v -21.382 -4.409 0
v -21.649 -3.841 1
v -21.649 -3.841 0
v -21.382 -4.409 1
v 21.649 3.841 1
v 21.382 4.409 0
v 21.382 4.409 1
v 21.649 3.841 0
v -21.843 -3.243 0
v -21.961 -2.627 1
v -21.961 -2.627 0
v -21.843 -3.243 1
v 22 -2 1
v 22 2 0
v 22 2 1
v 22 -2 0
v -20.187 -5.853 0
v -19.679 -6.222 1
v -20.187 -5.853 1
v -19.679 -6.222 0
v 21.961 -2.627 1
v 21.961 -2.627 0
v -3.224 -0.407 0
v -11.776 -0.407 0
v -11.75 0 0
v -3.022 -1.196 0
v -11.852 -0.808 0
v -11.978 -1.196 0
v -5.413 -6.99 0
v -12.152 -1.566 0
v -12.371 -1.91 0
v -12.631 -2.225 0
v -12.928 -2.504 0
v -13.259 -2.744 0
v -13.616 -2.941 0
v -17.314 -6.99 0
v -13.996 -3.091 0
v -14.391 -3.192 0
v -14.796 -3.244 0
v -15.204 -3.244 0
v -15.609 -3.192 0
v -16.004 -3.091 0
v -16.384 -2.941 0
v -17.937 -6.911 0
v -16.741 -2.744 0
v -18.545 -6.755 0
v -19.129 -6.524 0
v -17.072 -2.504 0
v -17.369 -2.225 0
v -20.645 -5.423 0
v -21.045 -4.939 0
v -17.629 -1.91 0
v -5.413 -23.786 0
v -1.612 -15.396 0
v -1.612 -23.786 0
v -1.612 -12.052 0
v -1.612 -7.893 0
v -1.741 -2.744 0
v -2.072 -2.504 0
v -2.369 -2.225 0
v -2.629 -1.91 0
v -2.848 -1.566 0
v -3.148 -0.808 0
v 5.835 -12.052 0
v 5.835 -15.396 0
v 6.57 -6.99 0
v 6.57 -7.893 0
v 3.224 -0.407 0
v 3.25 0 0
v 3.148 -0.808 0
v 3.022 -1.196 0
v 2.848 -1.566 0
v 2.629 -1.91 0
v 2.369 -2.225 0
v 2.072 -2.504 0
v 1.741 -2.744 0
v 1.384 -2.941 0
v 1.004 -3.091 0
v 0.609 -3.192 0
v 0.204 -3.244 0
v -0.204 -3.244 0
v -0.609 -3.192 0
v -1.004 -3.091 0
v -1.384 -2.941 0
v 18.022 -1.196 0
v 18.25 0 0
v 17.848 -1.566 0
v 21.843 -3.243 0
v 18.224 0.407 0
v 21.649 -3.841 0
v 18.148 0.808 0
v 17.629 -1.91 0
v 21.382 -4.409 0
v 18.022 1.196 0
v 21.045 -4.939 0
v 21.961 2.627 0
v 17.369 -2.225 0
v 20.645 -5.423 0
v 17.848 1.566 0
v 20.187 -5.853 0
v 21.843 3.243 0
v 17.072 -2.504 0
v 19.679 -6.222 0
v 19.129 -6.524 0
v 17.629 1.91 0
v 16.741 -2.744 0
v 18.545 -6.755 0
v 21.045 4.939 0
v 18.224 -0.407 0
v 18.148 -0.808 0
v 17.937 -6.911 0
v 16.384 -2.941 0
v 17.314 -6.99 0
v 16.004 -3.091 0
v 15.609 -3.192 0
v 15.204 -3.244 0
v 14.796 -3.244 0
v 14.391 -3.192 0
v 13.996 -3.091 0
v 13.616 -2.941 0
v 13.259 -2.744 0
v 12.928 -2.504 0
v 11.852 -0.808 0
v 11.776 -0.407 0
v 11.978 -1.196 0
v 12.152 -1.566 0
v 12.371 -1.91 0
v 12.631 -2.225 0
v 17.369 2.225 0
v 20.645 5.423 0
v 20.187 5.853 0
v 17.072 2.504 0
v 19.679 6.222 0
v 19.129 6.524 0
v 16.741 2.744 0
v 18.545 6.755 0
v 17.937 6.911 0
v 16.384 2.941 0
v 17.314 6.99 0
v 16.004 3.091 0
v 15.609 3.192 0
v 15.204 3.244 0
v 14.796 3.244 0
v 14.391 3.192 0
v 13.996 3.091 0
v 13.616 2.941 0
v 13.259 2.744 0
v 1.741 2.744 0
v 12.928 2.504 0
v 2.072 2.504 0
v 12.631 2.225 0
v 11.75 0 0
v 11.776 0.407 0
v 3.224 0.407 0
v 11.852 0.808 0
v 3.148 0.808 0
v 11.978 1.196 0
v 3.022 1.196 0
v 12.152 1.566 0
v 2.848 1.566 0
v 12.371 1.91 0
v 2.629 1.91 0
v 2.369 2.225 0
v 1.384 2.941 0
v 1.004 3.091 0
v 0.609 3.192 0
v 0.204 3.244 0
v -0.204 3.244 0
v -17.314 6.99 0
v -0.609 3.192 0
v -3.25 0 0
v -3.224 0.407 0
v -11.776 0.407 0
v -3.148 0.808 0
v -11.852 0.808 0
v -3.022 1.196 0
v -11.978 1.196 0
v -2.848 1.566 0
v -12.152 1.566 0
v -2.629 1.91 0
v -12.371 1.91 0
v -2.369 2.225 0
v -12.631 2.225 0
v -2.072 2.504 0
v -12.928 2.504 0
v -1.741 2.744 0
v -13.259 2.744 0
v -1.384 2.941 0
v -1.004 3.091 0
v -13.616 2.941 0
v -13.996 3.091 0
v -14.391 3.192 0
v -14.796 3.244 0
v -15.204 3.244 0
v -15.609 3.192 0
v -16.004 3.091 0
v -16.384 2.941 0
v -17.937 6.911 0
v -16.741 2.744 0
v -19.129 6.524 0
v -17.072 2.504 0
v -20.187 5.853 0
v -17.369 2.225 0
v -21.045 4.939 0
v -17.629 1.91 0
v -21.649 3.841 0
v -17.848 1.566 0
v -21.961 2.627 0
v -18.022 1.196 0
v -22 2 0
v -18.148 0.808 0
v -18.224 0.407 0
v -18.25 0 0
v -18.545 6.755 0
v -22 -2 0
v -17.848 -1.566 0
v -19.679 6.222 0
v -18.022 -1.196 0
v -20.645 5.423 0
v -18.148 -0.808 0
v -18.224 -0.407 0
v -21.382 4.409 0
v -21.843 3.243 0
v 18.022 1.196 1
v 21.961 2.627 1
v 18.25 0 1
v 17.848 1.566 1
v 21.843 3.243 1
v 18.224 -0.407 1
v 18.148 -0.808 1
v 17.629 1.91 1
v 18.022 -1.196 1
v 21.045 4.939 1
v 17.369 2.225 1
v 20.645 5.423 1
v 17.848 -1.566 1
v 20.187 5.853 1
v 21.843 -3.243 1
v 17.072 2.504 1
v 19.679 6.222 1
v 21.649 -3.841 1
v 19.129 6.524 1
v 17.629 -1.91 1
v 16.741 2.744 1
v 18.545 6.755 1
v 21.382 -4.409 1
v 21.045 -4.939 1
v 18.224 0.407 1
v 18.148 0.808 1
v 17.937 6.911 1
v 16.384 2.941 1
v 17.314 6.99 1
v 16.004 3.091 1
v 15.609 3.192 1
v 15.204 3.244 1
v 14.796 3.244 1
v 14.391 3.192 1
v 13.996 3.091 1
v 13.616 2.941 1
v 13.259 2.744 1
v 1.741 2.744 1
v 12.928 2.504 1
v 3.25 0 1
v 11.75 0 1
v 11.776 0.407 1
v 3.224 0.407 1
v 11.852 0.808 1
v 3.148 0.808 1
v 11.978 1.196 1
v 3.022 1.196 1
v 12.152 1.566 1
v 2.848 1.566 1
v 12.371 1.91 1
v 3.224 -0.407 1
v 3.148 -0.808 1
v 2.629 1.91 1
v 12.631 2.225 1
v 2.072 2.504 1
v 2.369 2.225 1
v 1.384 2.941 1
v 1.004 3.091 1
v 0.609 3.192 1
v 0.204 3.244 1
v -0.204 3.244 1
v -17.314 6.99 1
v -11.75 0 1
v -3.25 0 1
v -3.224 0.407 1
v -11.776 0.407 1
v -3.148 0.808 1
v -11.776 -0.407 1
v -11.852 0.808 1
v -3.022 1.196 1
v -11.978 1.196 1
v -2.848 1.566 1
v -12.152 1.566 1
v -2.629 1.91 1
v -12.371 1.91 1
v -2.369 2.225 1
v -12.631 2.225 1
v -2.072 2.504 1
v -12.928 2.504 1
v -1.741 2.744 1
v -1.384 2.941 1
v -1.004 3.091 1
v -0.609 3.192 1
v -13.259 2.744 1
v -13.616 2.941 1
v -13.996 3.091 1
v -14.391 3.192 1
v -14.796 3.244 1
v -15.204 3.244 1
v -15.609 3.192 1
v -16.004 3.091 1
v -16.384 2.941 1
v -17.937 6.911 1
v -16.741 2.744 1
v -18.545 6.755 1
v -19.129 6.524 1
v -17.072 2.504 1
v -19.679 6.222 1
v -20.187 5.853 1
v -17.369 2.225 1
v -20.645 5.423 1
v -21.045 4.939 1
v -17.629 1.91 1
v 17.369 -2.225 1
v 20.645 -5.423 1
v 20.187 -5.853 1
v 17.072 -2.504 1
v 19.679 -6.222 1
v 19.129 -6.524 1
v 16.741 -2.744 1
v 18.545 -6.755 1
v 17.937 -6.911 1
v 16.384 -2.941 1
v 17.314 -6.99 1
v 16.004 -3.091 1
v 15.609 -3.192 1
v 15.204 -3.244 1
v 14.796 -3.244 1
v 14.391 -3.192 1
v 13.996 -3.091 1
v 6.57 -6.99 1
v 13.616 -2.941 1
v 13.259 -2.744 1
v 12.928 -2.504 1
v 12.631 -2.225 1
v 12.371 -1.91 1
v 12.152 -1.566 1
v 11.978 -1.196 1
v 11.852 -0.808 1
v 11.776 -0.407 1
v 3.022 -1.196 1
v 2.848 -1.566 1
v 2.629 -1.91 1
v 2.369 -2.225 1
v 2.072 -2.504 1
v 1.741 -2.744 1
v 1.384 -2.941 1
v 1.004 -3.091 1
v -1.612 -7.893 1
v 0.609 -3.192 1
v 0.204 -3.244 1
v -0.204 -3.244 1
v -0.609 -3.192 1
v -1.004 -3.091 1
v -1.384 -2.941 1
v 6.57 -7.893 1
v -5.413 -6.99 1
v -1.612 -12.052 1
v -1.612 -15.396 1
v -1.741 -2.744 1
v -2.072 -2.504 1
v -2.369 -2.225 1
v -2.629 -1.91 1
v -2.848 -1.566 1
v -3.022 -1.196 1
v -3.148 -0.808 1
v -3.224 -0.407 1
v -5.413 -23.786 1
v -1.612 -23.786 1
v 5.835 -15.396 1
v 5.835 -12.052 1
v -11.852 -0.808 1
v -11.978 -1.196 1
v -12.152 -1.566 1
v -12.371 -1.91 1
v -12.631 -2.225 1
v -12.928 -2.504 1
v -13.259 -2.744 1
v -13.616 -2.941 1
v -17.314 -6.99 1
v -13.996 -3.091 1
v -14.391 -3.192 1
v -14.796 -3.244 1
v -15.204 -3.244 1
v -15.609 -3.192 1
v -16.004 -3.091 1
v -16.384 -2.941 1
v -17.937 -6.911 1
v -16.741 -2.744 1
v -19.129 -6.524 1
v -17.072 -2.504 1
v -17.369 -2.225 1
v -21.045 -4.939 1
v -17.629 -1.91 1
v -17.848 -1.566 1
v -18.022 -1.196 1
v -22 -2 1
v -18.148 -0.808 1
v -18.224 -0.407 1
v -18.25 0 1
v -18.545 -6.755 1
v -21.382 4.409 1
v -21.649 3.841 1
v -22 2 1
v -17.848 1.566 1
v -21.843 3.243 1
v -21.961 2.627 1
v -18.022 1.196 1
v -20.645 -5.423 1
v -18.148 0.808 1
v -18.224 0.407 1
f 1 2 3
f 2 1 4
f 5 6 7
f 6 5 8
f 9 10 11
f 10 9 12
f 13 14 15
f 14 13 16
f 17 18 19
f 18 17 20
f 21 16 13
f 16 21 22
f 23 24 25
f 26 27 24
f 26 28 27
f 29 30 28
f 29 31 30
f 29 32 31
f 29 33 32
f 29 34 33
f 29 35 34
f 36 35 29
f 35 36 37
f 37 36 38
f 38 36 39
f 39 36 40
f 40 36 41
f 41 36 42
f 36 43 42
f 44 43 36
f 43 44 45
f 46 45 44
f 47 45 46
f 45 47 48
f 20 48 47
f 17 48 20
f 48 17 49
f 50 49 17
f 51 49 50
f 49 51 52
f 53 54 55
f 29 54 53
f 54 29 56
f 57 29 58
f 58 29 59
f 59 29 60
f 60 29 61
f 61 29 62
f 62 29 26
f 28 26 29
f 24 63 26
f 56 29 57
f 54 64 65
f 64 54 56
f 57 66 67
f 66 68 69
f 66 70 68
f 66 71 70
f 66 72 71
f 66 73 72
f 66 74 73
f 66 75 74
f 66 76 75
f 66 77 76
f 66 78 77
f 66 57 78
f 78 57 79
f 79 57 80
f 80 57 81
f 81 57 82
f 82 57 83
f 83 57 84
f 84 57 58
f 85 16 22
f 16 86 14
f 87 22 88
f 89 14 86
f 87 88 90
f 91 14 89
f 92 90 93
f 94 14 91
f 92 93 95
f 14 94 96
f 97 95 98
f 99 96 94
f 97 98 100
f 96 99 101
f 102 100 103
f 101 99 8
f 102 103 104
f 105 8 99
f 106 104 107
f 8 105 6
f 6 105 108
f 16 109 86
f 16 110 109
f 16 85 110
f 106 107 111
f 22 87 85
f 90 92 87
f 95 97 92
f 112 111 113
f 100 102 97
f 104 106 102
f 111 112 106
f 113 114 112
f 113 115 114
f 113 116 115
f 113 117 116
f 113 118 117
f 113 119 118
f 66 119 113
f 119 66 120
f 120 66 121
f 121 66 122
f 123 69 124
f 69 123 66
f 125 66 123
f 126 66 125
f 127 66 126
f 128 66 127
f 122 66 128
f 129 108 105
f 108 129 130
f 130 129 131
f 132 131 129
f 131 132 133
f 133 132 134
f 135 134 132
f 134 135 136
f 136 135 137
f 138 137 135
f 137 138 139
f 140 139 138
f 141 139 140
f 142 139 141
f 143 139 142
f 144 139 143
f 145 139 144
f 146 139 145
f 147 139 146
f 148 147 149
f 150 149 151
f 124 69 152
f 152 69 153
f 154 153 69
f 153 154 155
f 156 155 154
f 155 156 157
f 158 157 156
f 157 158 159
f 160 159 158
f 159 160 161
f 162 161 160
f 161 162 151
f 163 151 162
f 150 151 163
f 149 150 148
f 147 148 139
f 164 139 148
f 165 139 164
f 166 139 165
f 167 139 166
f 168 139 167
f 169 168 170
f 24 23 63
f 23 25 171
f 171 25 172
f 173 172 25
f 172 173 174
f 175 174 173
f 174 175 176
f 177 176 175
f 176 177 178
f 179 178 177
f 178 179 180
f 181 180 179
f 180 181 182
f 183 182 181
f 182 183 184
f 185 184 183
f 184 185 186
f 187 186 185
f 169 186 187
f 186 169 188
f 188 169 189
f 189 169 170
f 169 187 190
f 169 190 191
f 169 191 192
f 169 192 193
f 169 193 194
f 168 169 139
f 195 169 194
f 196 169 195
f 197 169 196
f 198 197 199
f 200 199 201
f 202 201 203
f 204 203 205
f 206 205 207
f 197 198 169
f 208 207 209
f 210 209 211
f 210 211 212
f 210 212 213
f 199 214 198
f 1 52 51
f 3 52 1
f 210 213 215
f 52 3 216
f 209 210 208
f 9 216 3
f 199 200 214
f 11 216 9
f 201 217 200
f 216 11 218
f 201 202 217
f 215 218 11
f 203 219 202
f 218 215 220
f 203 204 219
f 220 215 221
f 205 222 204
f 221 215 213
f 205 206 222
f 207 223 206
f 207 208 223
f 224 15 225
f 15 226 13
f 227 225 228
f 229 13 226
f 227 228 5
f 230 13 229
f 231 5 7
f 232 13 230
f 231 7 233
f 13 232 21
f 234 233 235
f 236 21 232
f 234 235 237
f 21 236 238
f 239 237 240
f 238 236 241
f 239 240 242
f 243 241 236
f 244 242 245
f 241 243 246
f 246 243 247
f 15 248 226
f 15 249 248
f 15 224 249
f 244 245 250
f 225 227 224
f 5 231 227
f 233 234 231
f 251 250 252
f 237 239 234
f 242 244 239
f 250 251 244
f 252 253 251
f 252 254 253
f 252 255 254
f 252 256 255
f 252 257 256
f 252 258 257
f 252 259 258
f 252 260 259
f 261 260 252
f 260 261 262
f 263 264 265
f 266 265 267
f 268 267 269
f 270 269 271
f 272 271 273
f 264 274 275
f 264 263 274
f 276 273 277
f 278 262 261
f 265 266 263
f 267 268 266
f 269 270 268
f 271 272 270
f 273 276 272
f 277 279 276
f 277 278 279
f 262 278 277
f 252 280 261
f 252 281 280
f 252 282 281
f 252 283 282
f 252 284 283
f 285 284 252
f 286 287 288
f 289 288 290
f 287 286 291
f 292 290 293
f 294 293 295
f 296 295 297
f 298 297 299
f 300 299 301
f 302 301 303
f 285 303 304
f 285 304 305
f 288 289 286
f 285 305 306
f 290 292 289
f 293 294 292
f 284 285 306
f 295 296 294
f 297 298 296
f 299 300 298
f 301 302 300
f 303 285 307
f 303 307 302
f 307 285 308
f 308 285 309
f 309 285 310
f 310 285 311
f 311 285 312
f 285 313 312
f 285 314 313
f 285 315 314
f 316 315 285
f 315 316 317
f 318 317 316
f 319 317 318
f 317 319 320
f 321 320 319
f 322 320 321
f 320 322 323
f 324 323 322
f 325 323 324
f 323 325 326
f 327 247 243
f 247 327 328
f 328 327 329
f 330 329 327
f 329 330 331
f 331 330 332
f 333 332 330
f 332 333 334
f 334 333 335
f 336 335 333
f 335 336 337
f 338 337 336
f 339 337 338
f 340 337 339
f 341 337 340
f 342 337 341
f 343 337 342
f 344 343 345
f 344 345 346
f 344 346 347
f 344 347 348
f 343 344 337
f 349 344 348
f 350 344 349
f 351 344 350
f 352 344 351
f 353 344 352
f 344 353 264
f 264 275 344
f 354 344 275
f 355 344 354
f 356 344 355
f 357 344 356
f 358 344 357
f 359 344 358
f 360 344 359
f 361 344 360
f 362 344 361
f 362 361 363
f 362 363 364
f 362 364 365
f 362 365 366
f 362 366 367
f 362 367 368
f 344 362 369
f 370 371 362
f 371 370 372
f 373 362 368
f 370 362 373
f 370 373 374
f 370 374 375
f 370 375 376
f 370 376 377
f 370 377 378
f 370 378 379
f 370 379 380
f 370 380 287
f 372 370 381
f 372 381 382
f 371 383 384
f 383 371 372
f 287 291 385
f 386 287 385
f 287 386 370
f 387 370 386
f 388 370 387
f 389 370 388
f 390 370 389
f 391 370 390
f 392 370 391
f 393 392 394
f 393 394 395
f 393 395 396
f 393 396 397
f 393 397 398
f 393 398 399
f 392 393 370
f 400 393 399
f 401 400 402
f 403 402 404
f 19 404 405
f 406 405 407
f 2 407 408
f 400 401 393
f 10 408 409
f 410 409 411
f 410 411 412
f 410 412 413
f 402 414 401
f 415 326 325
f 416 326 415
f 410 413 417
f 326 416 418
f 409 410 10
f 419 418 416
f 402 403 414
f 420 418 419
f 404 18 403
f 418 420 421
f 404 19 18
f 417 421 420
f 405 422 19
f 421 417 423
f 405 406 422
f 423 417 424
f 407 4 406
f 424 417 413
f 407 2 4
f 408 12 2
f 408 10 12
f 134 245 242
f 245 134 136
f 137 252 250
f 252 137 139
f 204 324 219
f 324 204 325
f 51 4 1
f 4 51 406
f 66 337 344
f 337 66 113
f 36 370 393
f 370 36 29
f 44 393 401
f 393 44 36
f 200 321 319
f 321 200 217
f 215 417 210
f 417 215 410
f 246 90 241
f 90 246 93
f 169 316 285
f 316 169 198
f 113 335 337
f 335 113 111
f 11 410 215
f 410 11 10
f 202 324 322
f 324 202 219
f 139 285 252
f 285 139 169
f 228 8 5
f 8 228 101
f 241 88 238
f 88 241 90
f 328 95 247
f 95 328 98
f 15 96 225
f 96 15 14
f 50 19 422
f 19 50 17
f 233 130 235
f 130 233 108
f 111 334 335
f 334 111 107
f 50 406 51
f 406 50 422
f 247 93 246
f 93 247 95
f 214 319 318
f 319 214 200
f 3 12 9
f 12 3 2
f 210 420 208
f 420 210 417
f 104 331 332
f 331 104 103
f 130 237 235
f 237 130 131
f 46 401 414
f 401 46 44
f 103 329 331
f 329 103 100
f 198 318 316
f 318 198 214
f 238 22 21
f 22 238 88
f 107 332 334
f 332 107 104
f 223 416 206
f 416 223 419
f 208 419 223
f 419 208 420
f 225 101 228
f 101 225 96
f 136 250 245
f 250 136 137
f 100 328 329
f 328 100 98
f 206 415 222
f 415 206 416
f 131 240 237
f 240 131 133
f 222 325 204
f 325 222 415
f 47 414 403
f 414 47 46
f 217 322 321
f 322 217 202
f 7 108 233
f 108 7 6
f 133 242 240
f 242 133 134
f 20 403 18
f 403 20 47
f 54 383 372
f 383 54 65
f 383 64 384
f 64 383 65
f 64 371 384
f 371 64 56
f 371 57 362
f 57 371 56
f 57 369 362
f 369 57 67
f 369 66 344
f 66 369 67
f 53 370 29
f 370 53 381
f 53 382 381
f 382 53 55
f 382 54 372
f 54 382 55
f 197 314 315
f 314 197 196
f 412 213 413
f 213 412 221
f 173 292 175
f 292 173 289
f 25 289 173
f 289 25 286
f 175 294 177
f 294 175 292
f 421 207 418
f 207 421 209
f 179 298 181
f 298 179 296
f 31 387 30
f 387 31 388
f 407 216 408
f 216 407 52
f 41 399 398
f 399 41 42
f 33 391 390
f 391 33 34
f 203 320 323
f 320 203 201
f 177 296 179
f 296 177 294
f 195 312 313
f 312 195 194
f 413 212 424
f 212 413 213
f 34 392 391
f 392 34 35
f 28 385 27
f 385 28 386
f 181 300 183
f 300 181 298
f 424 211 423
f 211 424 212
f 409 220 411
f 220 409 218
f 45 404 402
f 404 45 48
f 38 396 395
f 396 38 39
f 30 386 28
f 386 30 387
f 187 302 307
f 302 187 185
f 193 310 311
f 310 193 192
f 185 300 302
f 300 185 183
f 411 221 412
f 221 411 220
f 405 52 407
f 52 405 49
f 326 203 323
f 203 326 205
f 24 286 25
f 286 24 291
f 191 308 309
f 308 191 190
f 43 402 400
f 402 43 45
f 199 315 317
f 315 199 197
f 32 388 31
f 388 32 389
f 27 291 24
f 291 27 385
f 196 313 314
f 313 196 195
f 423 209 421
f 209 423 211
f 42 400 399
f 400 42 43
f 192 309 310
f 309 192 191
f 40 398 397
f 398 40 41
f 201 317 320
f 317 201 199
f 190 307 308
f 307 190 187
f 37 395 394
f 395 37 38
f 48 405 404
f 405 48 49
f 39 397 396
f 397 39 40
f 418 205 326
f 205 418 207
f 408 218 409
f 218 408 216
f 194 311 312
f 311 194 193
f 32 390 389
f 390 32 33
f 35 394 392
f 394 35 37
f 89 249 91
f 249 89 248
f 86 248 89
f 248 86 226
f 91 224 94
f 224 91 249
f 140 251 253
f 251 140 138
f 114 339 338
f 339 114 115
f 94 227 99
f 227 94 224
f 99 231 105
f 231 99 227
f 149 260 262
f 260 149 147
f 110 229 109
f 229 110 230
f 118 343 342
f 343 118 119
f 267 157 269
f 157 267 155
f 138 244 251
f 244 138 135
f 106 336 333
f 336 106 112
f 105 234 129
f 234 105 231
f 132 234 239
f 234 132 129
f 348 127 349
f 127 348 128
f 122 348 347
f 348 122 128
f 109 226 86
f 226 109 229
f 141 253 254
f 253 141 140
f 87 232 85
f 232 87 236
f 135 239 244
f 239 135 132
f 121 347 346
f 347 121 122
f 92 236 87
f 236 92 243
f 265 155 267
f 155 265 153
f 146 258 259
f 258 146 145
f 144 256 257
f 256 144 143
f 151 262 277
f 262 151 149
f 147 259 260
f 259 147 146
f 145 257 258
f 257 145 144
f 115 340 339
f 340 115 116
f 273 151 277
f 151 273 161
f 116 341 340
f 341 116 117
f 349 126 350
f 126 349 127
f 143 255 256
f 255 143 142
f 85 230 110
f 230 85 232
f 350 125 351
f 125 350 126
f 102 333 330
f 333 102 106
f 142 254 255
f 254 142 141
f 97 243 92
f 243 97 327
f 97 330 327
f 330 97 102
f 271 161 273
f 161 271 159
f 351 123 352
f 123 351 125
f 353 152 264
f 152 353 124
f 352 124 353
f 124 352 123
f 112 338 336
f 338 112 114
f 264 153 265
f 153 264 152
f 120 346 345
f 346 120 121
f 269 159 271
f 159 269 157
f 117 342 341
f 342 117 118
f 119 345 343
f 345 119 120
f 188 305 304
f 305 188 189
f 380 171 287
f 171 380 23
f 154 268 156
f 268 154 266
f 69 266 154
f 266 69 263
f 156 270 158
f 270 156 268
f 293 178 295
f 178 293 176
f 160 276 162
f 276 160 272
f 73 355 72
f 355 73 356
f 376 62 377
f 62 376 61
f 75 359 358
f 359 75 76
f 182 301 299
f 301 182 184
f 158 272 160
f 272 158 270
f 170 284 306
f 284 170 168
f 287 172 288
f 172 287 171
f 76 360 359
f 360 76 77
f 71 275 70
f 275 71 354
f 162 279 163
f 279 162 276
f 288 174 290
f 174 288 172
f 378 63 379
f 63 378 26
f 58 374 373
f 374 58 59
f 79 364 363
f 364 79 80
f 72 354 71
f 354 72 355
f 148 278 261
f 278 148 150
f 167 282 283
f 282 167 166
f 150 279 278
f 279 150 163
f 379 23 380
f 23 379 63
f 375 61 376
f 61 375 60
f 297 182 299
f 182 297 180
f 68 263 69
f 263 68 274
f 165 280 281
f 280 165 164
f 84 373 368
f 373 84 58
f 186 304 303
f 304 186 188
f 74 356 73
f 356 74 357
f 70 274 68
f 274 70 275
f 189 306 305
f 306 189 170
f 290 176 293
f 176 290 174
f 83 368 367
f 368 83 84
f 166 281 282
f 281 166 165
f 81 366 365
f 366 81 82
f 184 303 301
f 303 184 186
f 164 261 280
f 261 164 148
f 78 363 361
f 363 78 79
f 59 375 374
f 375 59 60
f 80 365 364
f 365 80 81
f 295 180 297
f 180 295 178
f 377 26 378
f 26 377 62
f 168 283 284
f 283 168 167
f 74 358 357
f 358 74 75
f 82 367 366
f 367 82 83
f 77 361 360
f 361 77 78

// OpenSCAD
$fn = 50;


difference() {
	union() {
		translate(v = [0, 0, 0]) {
			rotate(a = [0, 0, 0]) {
				hull() {
					translate(v = [-17.0000000000, 2.0000000000, 0]) {
						rotate(a = [0, 0, 0]) {
							translate(v = [0, 0, 0]) {
								rotate(a = [0, 0, 0]) {
									cylinder(h = 1, r = 5);
								}
							}
						}
					}
					translate(v = [17.0000000000, 2.0000000000, 0]) {
						rotate(a = [0, 0, 0]) {
							translate(v = [0, 0, 0]) {
								rotate(a = [0, 0, 0]) {
									cylinder(h = 1, r = 5);
								}
							}
						}
					}
					translate(v = [-17.0000000000, -2.0000000000, 0]) {
						rotate(a = [0, 0, 0]) {
							translate(v = [0, 0, 0]) {
								rotate(a = [0, 0, 0]) {
									cylinder(h = 1, r = 5);
								}
							}
						}
					}
					translate(v = [17.0000000000, -2.0000000000, 0]) {
						rotate(a = [0, 0, 0]) {
							translate(v = [0, 0, 0]) {
								rotate(a = [0, 0, 0]) {
									cylinder(h = 1, r = 5);
								}
							}
						}
					}
				}
			}
		}
		translate(v = [0, -5, 0]) {
			rotate(a = [0, 0, 0]) {
				linear_extrude(height = 1) {
					text(font = "DejaVu Sans Mono:style=Bold", halign = "center", size = 19.0000000000, text = "F", valign = "top");
				}
			}
		}
	}
	union() {
		translate(v = [-15.0000000000, 0.0000000000, -125.0000000000]) {
			rotate(a = [0, 0, 0]) {
				cylinder(h = 250, r = 3.2500000000);
			}
		}
		translate(v = [15.0000000000, 0.0000000000, -125.0000000000]) {
			rotate(a = [0, 0, 0]) {
				cylinder(h = 250, r = 3.2500000000);
			}
		}
		translate(v = [15.0000000000, 0.0000000000, -125.0000000000]) {
			rotate(a = [0, 0, 0]) {
				cylinder(h = 250, r = 3.2500000000);
			}
		}
		translate(v = [0, 0, -125.0000000000]) {
			rotate(a = [0, 0, 0]) {
				cylinder(h = 250, r = 3.2500000000);
			}
		}
	}
}
